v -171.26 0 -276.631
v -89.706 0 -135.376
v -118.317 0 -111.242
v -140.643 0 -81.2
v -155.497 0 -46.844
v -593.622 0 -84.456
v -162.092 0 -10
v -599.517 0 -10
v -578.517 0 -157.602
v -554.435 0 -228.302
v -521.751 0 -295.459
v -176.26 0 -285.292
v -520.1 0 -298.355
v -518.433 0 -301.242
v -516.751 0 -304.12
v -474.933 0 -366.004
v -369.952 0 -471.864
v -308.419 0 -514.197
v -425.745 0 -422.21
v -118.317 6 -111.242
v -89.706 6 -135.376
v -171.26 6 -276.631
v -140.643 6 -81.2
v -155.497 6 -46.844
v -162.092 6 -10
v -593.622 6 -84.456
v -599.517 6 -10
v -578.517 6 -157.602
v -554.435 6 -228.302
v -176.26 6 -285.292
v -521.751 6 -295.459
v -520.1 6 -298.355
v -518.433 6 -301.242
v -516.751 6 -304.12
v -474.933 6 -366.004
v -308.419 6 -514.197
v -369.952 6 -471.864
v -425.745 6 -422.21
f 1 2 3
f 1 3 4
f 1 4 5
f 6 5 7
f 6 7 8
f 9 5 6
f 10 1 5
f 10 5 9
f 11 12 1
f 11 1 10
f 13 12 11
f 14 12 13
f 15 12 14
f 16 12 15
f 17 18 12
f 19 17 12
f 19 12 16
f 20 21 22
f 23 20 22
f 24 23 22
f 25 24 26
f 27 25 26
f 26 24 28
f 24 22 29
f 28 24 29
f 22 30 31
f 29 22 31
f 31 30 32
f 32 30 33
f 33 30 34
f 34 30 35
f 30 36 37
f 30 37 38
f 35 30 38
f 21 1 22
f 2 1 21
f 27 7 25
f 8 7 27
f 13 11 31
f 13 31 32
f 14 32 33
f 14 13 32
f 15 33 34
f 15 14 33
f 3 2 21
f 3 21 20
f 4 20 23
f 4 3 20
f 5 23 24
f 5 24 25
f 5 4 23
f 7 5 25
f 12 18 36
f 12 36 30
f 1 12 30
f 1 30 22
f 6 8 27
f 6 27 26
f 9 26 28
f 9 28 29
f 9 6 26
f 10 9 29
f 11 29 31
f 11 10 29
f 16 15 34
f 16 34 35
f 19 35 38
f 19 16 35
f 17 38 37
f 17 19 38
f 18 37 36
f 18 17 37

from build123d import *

# Parameters (mm, degrees)
BOSS_EXTRUDE1_DEPTH = 6


with BuildPart() as part:
    # Sketch1 → Boss-Extrude1 (new body)
    with BuildSketch(Plane(origin=(0, 0, 0), x_dir=(1, 0, 0), z_dir=(0, 1, 0))):
        with BuildLine():
            ThreePointArc((-521.750777563, 295.459449184), (-519.268832109, 299.8), (-516.750777563, 304.119703222))
            ThreePointArc((-516.750777563, 304.119703222), (-425.745445365, 422.209634839), (-308.418556675, 514.196610158))
            Line((-308.418556675, 514.196610158), (-176.260254038, 285.291715349))
            Line((-176.260254038, 285.291715349), (-171.260254038, 276.631461311))
            Line((-171.260254038, 276.631461311), (-89.706166951, 135.375638912))
            ThreePointArc((-89.706166951, 135.375638912), (-140.642525575, 81.2), (-162.091825827, 10))
            Line((-162.091825827, 10), (-325.2, 10))
            Line((-325.2, 10), (-335.2, 10))
            Line((-335.2, 10), (-599.516605275, 10))
            ThreePointArc((-599.516605275, 10), (-578.516992176, 157.601553812), (-521.750777563, 295.459449184))
        make_face()
    extrude(amount=BOSS_EXTRUDE1_DEPTH)


solid = part.part
